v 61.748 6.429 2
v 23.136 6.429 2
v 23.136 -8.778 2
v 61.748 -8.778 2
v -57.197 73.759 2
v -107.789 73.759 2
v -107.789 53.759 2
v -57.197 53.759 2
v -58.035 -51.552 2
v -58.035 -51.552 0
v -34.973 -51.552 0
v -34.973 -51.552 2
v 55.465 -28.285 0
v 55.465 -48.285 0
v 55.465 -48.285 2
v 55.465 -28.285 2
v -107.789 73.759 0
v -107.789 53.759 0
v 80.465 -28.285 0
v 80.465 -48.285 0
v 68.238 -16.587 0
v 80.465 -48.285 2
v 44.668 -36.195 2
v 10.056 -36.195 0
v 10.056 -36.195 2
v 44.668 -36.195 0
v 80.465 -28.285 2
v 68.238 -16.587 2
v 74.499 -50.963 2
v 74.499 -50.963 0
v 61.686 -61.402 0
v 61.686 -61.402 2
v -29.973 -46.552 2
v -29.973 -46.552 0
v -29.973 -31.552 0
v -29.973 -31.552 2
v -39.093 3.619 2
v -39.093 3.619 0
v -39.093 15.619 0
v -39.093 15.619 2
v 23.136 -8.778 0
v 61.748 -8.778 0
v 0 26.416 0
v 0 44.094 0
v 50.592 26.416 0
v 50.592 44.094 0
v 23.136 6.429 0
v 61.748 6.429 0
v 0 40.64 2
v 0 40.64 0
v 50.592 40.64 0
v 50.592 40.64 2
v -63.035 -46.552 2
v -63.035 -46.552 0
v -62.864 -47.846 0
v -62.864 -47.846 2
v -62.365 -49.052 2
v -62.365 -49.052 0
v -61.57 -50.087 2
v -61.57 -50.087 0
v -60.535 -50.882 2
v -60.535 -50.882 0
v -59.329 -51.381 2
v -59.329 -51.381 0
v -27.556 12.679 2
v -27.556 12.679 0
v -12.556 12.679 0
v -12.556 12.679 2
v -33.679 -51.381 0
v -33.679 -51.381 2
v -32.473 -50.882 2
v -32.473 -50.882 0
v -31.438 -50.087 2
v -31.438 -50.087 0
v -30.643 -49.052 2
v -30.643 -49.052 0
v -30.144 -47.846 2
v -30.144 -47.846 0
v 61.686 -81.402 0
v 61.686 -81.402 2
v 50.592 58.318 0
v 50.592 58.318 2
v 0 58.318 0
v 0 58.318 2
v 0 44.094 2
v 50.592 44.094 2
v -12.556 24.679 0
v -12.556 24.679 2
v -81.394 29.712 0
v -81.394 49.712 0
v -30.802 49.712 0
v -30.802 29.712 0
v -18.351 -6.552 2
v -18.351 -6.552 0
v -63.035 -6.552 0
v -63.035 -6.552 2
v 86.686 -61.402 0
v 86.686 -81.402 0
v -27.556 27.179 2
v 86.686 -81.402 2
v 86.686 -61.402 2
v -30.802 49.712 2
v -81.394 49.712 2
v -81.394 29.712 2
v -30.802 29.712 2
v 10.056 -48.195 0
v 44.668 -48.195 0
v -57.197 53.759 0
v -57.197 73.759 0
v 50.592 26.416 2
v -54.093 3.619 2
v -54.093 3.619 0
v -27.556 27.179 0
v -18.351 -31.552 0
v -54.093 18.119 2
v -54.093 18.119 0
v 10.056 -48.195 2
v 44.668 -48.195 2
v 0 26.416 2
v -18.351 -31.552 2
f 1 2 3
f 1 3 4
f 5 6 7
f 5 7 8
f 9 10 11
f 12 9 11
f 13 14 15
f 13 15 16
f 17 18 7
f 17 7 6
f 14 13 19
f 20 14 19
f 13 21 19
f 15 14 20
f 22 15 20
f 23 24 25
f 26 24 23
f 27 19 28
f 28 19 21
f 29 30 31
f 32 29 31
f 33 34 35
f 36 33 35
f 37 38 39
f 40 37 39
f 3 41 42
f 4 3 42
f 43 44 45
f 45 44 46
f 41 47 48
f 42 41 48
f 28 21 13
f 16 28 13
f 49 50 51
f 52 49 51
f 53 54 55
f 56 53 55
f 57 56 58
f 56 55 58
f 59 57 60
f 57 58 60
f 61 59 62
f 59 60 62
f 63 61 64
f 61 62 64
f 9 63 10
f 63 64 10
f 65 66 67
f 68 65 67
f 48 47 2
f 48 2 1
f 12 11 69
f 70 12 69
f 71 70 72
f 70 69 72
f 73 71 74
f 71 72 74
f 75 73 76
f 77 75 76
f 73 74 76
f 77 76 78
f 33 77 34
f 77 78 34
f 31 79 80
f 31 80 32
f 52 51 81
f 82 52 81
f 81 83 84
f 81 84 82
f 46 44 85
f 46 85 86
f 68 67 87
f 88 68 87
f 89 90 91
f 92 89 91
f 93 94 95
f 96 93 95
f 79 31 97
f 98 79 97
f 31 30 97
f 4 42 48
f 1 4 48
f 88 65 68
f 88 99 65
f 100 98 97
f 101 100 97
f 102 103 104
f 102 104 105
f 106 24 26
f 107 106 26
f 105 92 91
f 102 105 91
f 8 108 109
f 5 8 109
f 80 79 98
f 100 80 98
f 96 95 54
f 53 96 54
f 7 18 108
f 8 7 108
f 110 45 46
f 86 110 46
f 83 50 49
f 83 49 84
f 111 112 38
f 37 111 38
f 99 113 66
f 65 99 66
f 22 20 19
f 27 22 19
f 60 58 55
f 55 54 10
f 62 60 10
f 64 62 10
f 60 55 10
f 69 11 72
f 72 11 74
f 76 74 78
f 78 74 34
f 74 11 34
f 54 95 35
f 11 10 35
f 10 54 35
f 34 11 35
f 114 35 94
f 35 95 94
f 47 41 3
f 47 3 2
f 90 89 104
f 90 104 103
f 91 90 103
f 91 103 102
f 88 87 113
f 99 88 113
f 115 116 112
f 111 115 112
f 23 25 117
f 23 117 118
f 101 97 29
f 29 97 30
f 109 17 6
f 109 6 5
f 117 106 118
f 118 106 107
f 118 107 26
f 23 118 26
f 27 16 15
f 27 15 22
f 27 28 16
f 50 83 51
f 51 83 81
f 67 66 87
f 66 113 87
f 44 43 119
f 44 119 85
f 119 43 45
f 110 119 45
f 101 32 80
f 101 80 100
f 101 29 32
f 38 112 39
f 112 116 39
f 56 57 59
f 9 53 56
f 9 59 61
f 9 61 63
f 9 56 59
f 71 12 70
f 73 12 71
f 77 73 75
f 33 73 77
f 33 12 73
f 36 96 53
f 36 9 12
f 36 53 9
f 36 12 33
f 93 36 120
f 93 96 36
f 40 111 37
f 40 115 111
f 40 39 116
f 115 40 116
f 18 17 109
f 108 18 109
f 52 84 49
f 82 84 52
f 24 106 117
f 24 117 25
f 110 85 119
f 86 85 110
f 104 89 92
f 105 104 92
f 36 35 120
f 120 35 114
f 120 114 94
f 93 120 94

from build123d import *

# Parameters (mm, degrees)
F1_W      = 50.592
F1_H      = 20
F10_DEPTH = 2
F5_W      = 15
F5_H      = 12
F4_W      = 15
F4_H      = 12
F0_W      = 50.592
F0_H      = 20
F2_W      = 50.592
F2_H      = 17.678
F3_W      = 50.592
F3_H      = 17.678
F6_W      = 38.612
F6_H      = 15.207
F7_W      = 34.612
F7_H      = 12
F8_W      = 25
F8_H      = 20
F9_W      = 25
F9_H      = 20


with BuildPart() as f10:
    # F1 (on Top) → F10 (new body)
    with BuildSketch(Plane.XY):
        with Locations((-82.4932979216, 63.7588351965)):
            Rectangle(F1_W, F1_H)
    extrude(amount=F10_DEPTH)


with BuildPart() as f10b:
    # F5 (on Top) → F10, piece 2 (new body)
    with BuildSketch(Plane.XY):
        with Locations((-20.0563894267, 18.6787252277)):
            Rectangle(F5_W, F5_H)
        Polygon((-27.5563894267, 27.1787252277), (-27.5563894267, 24.6787252277), (-12.5563894267, 24.6787252277), align=None)
    extrude(amount=F10_DEPTH)


with BuildPart() as f10c:
    # F4 (on Top) → F10, piece 3 (new body)
    with BuildSketch(Plane.XY):
        with Locations((-46.593231149, 9.6191507727)):
            Rectangle(F4_W, F4_H)
        Polygon((-54.093231149, 18.1191507727), (-54.093231149, 15.6191507727), (-39.093231149, 15.6191507727), align=None)
    extrude(amount=F10_DEPTH)


with BuildPart() as f10d:
    # F0 (on Top) → F10, piece 4 (new body)
    with BuildSketch(Plane.XY):
        with Locations((-56.0977410712, 39.7115184367)):
            Rectangle(F0_W, F0_H)
    extrude(amount=F10_DEPTH)


with BuildPart() as f10e:
    # F2 (on Top) → F10, piece 5 (new body)
    with BuildSketch(Plane.XY):
        with Locations((25.296, 49.4785104464)):
            Rectangle(F2_W, F2_H)
    extrude(amount=F10_DEPTH)


with BuildPart() as f10f:
    # F3 (on Top) → F10, piece 6 (new body)
    with BuildSketch(Plane.XY):
        with Locations((25.296, 35.2548963126)):
            Rectangle(F3_W, F3_H)
    extrude(amount=F10_DEPTH)


with BuildPart() as f10g:
    # F6 (on Top) → F10, piece 7 (new body)
    with BuildSketch(Plane.XY):
        with Locations((42.4418825417, -1.1743893847)):
            Rectangle(F6_W, F6_H)
    extrude(amount=F10_DEPTH)


with BuildPart() as f10h:
    # F6 (on Top) → F10, piece 8 (new body)
    with BuildSketch(Plane.XY):
        Polygon((-18.3506011963, -6.5516024038), (-63.034683466, -6.5516024038), (-63.034683466, -31.5516024038), (-29.9733750251, -31.5516024038), (-18.3506011963, -31.5516024038), align=None)
        with BuildLine():
            Line((-29.9733750251, -31.5516024038), (-63.034683466, -31.5516024038))
            Line((-63.034683466, -31.5516024038), (-63.034683466, -46.5516024038))
            ThreePointArc((-63.034683466, -46.5516024038), (-61.5702173719, -50.0871363097), (-58.034683466, -51.5516024038))
            Line((-58.034683466, -51.5516024038), (-34.9733750251, -51.5516024038))
            ThreePointArc((-34.9733750251, -51.5516024038), (-31.4378411191, -50.0871363097), (-29.9733750251, -46.5516024038))
            Line((-29.9733750251, -46.5516024038), (-29.9733750251, -31.5516024038))
        make_face()
    extrude(amount=F10_DEPTH)


with BuildPart() as f10i:
    # F7 (on Top) → F10, piece 9 (new body)
    with BuildSketch(Plane.XY):
        with Locations((27.3617086989, -42.1949746609)):
            Rectangle(F7_W, F7_H)
    extrude(amount=F10_DEPTH)


with BuildPart() as f10j:
    # F8 (on Top) → F10, piece 10 (new body)
    with BuildSketch(Plane.XY):
        with Locations((67.9650614148, -38.2854957134)):
            Rectangle(F8_W, F8_H)
        Polygon((68.2384073734, -16.5874473751), (55.4650614148, -28.2854957134), (80.4650614148, -28.2854957134), align=None)
    extrude(amount=F10_DEPTH)


with BuildPart() as f10k:
    # F9 (on Top) → F10, piece 11 (new body)
    with BuildSketch(Plane.XY):
        with Locations((74.1860326253, -71.4023821056)):
            Rectangle(F9_W, F9_H)
        Polygon((74.4991078973, -50.9625710547), (61.6860326253, -61.4023821056), (86.6860326253, -61.4023821056), align=None)
    extrude(amount=F10_DEPTH)


solid = Compound([f10.part, f10b.part, f10c.part, f10d.part, f10e.part, f10f.part, f10g.part, f10h.part, f10i.part, f10j.part, f10k.part])
